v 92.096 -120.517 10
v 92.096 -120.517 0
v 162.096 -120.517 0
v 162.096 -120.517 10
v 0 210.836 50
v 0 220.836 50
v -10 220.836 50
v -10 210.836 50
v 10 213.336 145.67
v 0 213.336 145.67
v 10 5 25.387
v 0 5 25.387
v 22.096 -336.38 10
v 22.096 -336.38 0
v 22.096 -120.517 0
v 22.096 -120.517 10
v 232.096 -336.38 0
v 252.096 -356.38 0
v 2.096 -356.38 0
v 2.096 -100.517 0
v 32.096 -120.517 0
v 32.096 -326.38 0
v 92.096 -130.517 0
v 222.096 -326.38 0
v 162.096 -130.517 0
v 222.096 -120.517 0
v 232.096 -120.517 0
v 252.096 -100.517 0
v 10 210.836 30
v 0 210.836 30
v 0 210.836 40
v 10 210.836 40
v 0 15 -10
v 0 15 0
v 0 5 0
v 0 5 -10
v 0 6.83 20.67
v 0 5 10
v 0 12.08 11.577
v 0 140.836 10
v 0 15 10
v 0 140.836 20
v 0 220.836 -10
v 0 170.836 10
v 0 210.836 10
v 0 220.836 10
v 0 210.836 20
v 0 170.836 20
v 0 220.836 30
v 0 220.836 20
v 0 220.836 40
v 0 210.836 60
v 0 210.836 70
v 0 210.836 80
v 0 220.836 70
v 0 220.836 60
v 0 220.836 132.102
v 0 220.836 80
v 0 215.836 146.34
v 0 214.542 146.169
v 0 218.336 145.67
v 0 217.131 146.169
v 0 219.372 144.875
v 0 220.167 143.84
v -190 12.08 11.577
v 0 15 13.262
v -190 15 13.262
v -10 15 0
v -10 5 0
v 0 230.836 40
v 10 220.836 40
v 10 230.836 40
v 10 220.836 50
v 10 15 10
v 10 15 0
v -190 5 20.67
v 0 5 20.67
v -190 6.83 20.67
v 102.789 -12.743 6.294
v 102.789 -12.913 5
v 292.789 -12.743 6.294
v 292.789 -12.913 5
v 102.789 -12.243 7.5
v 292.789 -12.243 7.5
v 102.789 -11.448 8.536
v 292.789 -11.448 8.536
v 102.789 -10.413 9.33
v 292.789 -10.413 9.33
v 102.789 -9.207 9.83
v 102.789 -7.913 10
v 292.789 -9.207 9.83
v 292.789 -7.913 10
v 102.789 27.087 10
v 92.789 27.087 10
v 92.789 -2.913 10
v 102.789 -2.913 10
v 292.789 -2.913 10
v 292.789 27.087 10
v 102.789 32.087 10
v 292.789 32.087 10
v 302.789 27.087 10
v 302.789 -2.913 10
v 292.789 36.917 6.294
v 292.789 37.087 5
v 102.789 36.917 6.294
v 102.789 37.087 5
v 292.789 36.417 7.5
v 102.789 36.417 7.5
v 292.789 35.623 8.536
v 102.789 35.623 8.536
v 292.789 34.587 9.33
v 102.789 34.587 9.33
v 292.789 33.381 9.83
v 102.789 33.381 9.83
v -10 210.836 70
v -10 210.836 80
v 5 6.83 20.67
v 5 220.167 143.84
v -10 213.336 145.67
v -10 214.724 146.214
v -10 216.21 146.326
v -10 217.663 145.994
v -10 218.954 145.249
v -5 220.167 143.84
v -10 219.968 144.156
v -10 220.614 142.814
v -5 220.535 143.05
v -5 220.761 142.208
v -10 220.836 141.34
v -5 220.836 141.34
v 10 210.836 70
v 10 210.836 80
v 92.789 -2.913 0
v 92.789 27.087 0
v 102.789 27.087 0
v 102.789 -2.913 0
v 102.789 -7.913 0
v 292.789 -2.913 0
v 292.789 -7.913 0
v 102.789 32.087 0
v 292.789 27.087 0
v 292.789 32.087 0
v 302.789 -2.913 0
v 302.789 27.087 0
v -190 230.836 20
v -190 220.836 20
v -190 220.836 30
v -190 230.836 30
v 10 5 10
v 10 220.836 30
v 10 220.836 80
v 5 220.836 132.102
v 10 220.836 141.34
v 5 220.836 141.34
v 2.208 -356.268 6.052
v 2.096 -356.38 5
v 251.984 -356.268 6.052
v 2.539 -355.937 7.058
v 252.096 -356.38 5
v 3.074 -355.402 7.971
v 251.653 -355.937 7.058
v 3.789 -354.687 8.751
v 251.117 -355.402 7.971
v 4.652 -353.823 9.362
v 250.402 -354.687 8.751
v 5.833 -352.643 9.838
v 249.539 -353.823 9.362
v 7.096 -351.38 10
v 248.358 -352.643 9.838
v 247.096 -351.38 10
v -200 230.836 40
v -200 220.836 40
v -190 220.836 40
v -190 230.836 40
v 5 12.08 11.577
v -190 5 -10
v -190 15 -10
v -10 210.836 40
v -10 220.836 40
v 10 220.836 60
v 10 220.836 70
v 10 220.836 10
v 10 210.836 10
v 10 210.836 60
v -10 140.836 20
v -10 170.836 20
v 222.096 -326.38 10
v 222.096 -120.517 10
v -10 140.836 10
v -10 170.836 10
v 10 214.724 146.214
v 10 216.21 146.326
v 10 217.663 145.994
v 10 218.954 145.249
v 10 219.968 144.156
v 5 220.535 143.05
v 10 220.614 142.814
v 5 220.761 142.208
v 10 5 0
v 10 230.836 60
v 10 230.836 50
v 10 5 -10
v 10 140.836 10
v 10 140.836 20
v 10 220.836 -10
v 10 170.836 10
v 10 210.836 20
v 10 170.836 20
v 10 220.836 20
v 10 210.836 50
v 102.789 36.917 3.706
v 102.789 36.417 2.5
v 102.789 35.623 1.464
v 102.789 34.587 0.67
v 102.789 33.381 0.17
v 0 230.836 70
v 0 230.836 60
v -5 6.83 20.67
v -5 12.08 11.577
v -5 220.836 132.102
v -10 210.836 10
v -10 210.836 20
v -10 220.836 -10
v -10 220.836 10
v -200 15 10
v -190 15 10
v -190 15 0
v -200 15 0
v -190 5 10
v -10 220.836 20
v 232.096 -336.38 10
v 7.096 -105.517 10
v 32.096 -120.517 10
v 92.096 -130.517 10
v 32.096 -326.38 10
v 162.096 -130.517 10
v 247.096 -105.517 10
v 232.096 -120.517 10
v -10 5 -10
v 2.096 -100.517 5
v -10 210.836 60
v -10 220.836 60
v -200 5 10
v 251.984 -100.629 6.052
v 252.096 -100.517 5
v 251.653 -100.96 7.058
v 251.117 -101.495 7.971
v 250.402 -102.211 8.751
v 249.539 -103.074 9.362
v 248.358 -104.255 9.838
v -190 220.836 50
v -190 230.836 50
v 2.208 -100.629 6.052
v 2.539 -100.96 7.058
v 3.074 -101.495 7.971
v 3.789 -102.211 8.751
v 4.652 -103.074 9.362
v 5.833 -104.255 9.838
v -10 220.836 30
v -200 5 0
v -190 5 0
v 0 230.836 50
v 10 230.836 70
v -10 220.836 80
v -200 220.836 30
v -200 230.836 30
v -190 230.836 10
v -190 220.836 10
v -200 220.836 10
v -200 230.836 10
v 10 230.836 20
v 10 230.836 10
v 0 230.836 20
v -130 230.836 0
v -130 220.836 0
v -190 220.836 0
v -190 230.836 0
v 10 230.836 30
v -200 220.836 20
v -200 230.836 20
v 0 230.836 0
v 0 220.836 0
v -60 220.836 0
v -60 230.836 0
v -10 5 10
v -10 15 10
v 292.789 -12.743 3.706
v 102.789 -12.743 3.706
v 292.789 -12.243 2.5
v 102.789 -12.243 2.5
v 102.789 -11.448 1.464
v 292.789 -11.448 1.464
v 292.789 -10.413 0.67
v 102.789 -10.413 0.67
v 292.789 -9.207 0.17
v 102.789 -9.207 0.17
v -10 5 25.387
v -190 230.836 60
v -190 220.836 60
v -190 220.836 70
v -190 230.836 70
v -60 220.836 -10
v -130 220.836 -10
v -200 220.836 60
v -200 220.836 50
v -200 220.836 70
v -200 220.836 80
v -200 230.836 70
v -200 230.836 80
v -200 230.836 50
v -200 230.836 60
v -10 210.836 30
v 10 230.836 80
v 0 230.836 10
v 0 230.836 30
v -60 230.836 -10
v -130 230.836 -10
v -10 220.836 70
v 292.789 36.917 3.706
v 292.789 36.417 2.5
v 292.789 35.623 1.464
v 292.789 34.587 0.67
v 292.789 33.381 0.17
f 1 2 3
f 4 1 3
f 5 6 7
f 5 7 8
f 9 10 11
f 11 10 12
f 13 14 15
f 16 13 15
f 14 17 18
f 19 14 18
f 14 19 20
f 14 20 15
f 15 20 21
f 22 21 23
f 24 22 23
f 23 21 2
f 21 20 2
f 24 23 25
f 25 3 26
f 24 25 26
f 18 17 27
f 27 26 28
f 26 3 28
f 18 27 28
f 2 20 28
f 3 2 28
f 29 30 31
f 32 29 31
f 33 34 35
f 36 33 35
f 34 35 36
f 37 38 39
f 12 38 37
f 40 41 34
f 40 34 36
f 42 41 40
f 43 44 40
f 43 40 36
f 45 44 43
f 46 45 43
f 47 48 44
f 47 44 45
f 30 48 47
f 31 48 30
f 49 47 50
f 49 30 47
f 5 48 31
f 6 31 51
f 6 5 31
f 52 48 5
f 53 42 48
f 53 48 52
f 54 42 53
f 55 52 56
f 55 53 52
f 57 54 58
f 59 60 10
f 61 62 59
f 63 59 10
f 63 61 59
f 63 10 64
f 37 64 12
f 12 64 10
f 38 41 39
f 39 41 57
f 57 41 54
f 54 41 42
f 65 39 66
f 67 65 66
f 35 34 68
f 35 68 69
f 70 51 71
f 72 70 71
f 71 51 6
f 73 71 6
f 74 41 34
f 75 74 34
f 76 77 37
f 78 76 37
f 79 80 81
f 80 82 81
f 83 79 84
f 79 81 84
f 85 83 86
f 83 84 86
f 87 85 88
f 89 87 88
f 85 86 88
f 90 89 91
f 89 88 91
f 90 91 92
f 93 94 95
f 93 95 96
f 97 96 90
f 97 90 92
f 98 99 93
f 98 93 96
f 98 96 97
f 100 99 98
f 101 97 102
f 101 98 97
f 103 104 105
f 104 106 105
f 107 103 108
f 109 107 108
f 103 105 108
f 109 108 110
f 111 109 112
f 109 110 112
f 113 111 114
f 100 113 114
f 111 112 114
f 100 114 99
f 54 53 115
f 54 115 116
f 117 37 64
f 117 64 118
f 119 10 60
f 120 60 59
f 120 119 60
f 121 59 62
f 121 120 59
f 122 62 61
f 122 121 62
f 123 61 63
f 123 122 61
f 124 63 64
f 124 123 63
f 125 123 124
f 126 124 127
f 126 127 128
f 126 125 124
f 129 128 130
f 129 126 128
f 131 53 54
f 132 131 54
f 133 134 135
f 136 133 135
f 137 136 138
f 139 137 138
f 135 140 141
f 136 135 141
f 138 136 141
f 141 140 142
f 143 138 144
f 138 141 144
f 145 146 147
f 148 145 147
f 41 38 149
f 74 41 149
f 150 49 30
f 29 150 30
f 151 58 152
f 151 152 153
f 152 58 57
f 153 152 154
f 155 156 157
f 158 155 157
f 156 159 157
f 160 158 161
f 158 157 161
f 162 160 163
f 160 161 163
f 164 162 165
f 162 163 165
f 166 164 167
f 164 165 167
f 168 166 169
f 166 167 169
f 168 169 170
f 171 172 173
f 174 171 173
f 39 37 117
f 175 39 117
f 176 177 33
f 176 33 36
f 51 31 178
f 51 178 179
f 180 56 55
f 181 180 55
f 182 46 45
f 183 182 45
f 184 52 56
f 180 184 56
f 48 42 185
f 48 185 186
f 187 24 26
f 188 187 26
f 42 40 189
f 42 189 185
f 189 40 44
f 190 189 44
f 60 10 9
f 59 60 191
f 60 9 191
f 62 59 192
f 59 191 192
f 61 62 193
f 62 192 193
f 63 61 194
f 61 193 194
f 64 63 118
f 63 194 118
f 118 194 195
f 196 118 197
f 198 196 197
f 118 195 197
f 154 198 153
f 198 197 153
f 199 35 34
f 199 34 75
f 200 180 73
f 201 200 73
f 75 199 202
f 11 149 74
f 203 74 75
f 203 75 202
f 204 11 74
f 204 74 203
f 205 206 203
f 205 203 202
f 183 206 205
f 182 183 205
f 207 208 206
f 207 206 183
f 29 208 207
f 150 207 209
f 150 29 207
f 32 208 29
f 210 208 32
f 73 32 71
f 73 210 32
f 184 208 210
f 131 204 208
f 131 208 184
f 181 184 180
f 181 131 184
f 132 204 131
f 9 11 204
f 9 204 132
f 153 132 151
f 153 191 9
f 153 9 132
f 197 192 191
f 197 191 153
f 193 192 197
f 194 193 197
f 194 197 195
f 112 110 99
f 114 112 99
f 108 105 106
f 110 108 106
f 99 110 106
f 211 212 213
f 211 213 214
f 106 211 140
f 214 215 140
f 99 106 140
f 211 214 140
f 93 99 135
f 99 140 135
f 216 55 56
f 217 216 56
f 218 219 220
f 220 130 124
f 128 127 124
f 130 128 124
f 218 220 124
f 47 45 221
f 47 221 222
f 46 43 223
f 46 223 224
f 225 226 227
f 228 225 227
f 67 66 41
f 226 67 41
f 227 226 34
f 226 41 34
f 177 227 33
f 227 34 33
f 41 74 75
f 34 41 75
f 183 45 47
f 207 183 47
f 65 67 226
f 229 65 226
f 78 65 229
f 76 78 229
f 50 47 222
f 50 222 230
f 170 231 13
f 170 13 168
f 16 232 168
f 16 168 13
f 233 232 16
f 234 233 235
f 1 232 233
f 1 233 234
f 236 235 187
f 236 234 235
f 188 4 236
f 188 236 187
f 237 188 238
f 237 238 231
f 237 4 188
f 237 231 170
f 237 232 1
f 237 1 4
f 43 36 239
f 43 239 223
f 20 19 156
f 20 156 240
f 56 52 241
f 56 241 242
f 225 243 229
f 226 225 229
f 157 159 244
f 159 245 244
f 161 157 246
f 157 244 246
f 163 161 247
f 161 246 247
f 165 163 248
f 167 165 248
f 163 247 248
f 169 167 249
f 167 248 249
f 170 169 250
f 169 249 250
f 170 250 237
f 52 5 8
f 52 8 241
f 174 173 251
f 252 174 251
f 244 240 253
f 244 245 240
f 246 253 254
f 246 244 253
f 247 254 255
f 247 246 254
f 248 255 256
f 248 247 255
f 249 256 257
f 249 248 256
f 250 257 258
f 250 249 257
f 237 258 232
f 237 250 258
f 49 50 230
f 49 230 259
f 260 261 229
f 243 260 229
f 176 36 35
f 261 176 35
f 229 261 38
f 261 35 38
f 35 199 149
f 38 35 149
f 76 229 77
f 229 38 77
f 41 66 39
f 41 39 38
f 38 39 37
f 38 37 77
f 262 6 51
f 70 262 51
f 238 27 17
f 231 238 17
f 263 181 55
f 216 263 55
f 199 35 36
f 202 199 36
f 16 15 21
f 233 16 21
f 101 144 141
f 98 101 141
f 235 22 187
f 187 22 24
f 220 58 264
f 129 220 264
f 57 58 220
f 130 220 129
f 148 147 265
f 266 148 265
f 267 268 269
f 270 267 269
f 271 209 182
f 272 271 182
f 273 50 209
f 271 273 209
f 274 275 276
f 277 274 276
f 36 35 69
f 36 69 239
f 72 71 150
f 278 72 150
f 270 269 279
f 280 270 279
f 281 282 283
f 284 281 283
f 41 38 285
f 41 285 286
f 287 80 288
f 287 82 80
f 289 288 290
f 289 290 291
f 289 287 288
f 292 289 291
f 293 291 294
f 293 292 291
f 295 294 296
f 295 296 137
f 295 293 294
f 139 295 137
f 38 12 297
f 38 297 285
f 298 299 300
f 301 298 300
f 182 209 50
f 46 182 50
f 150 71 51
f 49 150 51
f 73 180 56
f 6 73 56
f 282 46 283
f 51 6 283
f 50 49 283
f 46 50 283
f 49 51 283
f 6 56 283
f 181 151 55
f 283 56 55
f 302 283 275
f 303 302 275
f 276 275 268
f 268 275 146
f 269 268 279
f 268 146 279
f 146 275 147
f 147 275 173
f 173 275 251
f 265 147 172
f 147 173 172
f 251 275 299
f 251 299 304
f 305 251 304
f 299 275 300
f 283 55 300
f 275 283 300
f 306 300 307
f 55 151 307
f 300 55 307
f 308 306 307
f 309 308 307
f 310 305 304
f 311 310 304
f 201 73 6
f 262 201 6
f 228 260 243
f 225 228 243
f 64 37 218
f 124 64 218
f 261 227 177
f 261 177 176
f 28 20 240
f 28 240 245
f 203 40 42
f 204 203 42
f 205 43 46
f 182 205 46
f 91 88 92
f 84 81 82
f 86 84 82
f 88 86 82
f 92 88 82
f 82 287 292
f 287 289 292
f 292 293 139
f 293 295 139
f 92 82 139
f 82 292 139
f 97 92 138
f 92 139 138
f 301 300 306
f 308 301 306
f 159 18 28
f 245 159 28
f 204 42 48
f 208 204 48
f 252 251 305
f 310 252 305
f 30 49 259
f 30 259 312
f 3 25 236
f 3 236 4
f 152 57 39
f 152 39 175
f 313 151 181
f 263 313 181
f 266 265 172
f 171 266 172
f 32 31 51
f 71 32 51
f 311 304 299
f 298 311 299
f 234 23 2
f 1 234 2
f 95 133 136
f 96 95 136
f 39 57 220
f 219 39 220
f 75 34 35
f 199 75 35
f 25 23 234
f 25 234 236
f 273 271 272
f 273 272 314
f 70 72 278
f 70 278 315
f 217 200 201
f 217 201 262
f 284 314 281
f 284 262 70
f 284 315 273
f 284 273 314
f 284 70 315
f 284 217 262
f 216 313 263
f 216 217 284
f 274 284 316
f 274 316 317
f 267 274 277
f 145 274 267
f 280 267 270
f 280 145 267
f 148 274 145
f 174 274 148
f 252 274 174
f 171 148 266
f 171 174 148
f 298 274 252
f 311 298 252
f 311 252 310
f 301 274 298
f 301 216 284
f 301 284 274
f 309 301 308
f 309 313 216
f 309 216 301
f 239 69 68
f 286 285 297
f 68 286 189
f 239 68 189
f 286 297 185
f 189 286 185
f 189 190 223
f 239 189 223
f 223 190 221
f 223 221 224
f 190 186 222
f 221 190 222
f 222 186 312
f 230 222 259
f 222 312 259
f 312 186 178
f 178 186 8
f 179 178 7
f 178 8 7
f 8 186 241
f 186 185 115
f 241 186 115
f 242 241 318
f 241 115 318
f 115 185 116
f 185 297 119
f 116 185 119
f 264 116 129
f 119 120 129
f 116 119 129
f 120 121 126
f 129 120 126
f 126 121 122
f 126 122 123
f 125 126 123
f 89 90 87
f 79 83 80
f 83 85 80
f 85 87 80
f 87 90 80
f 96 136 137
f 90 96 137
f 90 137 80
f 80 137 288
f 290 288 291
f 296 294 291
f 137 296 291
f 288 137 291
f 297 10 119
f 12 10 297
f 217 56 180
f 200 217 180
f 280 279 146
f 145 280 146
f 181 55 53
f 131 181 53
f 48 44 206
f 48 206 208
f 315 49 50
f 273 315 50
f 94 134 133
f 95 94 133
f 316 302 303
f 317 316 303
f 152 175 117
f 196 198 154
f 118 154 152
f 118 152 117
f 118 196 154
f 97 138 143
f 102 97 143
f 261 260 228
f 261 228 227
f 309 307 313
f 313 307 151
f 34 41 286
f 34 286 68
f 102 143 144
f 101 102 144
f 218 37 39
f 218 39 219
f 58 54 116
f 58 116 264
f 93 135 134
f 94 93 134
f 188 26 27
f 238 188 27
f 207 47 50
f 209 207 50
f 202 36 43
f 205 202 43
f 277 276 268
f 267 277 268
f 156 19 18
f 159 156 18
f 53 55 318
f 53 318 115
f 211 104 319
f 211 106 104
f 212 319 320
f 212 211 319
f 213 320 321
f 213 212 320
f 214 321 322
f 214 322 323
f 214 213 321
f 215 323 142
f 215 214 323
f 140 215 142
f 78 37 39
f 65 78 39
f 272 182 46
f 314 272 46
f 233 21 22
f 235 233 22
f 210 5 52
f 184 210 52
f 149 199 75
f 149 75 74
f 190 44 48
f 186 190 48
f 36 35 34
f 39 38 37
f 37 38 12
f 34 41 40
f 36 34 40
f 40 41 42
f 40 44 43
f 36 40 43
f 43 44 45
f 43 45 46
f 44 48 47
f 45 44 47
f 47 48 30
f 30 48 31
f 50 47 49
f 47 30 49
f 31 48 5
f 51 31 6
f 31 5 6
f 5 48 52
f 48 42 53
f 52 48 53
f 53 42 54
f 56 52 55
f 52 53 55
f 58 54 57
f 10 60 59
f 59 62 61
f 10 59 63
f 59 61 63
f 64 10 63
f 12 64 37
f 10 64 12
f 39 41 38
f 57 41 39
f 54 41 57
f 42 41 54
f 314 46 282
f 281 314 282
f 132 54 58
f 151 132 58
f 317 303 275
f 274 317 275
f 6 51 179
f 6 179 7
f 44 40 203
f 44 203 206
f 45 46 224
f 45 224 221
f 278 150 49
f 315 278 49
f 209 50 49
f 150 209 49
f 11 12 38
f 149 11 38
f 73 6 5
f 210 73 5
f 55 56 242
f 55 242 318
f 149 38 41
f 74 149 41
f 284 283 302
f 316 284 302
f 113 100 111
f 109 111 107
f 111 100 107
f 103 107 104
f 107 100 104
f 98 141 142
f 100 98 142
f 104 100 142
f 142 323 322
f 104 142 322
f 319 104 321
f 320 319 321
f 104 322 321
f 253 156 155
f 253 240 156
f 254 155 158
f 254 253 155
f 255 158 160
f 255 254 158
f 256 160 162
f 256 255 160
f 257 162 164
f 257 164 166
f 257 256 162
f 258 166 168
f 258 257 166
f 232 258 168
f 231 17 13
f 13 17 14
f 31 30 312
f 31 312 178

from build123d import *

# Parameters (mm, degrees)
F0_W      = 30
F0_H      = 10
F1_DEPTH  = 10
F3_W      = 5
F3_H      = 10.5
F4_DEPTH  = 250
F6_W      = 250
F6_H      = 255.863
F6_W_2    = 70
F6_H_2    = 10
F7_DEPTH  = 10
F9_DEPTH  = 190
F10_W     = 10
F10_H     = 10
F11_DEPTH = 10
F13_DEPTH = 10
F15_DEPTH = 10
F16_R     = 5
F16_2_R   = 5
F17_R     = 5
F18_R     = 4.99999


# Not quite as in the source:
# - a fillet or chamfer is up to 0.001 mm smaller than in the source, because OpenCascade refuses the exact size


with BuildPart() as f1:
    # F0 (on Right) → F1 (new body)
    with BuildSketch(Plane.YZ):
        Polygon((220.836477965, 150), (5, 25.3867513459), (5, 10), (15, 10), (15, 0), (5, 0), (5, -10), (220.836477965, -10), (220.836477965, 0), (220.836477965, 10), (210.836477965, 10), (210.836477965, 20), (220.836477965, 20), (220.836477965, 30), (210.836477965, 30), (210.836477965, 40), (220.836477965, 40), (220.836477965, 50), (210.836477965, 50), (210.836477965, 60), (220.836477965, 60), (220.836477965, 70), (210.836477965, 70), (210.836477965, 80), (220.836477965, 80), align=None)
        with Locations((155.836477965, 15)):
            Rectangle(F0_W, F0_H, mode=Mode.SUBTRACT)
    extrude(amount=F1_DEPTH)

    # F3 (on face) → F4 (cut)
    with BuildSketch(Plane(origin=(0, 230.5792637576, 133.125), x_dir=(1, 0, 0), z_dir=(0, -0.8660254038, -0.5))):
        with Locations((2.5, 9.2355715851)):
            Rectangle(F3_W, F3_H)
    extrude(amount=F4_DEPTH, mode=Mode.SUBTRACT)


with BuildPart() as f5_1:
    # F5: instance of F1
    add(f1.part.mirror(Plane.YZ))

    # F16#2
    f16_2_edges = [f5_1.edges().sort_by_distance(p)[0] for p in [
        (-5, 220.836478, 150),
    ]]
    fillet(f16_2_edges, radius=F16_2_R)


with BuildPart() as f7:
    # F6 (on Top) → F7 (new body)
    with BuildSketch(Plane.XY):
        with Locations((127.095540093, -228.4486843696)):
            Rectangle(F6_W, F6_H)
        Polygon((222.095540093, -120.5171843696), (232.095540093, -120.5171843696), (232.095540093, -336.3801843696), (222.992540093, -336.3801843696), (31.232540093, -336.3801843696), (22.095540093, -336.3801843696), (22.095540093, -120.5171843696), (32.095540093, -120.5171843696), (32.095540093, -326.3801843696), (222.095540093, -326.3801843696), align=None, mode=Mode.SUBTRACT)
        with Locations((127.095540093, -125.5171843696)):
            Rectangle(F6_W_2, F6_H_2, mode=Mode.SUBTRACT)
    extrude(amount=F7_DEPTH)

    # F17
    f17_edges = [f7.edges().sort_by_distance(p)[0] for p in [
        (2.09554, -228.448684, 10),
        (127.09554, -356.380184, 10),
        (252.09554, -228.448684, 10),
        (127.09554, -100.517184, 10),
    ]]
    fillet(f17_edges, radius=F17_R)


with BuildPart() as f9:
    # F8 (on face) → F9 (new body)
    with BuildSketch(Plane(origin=(0, 0, 0), x_dir=(0, -1, 0), z_dir=(-1, 0, 0))):
        Polygon((-15, -10), (-5, -10), (-5, 20.6698729811), (-6.8301270189, 20.6698729811), (-12.0801270189, 11.5766062413), (-15, 13.262395693), align=None)
    extrude(amount=F9_DEPTH)

    # F10 (on face) → F11 (join)
    with BuildSketch(Plane.XZ.offset(-5)):
        with Locations((5, 5)):
            Rectangle(F10_W, F10_H)
        with Locations((-195, 5)):
            Rectangle(F10_W, F10_H)
    extrude(amount=-F11_DEPTH)


with BuildPart() as f13:
    # F12 (on face) → F13 (new body)
    with BuildSketch(Plane(origin=(0, 220.836477965, 0), x_dir=(-1, 0, 0), z_dir=(0, 1, 0))):
        Polygon((0, 10), (0, 0), (60, 0), (60, -10), (95, -10), (130, -10), (130, 0), (190, 0), (190, 10), (200, 10), (200, 20), (190, 20), (190, 30), (200, 30), (200, 40), (190, 40), (190, 50), (200, 50), (200, 60), (190, 60), (190, 70), (200, 70), (200, 80), (95, 80), (-10, 80), (-10, 70), (0, 70), (0, 60), (-10, 60), (-10, 50), (0, 50), (0, 40), (-10, 40), (-10, 30), (0, 30), (0, 20), (-10, 20), (-10, 10), align=None)
    extrude(amount=F13_DEPTH)


with BuildPart() as f15:
    # F14 (on Top) → F15 (new body)
    with BuildSketch(Plane.XY):
        Polygon((292.7889656446, 37.0870450573), (102.7889656446, 37.0870450573), (102.7889656446, 27.0870450573), (92.7889656446, 27.0870450573), (92.7889656446, -2.9129549427), (102.7889656446, -2.9129549427), (102.7889656446, -12.9129549427), (292.7889656446, -12.9129549427), (292.7889656446, -2.9129549427), (302.7889656446, -2.9129549427), (302.7889656446, 27.0870450573), (292.7889656446, 27.0870450573), align=None)
    extrude(amount=F15_DEPTH)

    # F18 (radius 5 in the source; OpenCascade refuses exactly that, so slightly less here)
    f18_edges = [f15.edges().sort_by_distance(p)[0] for p in [
        (197.788966, 37.087045, 10),
        (197.788966, 37.087045, 0),
        (197.788966, -12.912955, 10),
        (197.788966, -12.912955, 0),
    ]]
    fillet(f18_edges, radius=F18_R)


with BuildPart() as f1_1:
    add(f1.part)

    # F16
    f16_edges = [f1_1.edges().sort_by_distance(p)[0] for p in [
        (5, 220.836478, 150),
    ]]
    fillet(f16_edges, radius=F16_R)


solid = Compound([f5_1.part, f7.part, f9.part, f13.part, f15.part, f1_1.part])
